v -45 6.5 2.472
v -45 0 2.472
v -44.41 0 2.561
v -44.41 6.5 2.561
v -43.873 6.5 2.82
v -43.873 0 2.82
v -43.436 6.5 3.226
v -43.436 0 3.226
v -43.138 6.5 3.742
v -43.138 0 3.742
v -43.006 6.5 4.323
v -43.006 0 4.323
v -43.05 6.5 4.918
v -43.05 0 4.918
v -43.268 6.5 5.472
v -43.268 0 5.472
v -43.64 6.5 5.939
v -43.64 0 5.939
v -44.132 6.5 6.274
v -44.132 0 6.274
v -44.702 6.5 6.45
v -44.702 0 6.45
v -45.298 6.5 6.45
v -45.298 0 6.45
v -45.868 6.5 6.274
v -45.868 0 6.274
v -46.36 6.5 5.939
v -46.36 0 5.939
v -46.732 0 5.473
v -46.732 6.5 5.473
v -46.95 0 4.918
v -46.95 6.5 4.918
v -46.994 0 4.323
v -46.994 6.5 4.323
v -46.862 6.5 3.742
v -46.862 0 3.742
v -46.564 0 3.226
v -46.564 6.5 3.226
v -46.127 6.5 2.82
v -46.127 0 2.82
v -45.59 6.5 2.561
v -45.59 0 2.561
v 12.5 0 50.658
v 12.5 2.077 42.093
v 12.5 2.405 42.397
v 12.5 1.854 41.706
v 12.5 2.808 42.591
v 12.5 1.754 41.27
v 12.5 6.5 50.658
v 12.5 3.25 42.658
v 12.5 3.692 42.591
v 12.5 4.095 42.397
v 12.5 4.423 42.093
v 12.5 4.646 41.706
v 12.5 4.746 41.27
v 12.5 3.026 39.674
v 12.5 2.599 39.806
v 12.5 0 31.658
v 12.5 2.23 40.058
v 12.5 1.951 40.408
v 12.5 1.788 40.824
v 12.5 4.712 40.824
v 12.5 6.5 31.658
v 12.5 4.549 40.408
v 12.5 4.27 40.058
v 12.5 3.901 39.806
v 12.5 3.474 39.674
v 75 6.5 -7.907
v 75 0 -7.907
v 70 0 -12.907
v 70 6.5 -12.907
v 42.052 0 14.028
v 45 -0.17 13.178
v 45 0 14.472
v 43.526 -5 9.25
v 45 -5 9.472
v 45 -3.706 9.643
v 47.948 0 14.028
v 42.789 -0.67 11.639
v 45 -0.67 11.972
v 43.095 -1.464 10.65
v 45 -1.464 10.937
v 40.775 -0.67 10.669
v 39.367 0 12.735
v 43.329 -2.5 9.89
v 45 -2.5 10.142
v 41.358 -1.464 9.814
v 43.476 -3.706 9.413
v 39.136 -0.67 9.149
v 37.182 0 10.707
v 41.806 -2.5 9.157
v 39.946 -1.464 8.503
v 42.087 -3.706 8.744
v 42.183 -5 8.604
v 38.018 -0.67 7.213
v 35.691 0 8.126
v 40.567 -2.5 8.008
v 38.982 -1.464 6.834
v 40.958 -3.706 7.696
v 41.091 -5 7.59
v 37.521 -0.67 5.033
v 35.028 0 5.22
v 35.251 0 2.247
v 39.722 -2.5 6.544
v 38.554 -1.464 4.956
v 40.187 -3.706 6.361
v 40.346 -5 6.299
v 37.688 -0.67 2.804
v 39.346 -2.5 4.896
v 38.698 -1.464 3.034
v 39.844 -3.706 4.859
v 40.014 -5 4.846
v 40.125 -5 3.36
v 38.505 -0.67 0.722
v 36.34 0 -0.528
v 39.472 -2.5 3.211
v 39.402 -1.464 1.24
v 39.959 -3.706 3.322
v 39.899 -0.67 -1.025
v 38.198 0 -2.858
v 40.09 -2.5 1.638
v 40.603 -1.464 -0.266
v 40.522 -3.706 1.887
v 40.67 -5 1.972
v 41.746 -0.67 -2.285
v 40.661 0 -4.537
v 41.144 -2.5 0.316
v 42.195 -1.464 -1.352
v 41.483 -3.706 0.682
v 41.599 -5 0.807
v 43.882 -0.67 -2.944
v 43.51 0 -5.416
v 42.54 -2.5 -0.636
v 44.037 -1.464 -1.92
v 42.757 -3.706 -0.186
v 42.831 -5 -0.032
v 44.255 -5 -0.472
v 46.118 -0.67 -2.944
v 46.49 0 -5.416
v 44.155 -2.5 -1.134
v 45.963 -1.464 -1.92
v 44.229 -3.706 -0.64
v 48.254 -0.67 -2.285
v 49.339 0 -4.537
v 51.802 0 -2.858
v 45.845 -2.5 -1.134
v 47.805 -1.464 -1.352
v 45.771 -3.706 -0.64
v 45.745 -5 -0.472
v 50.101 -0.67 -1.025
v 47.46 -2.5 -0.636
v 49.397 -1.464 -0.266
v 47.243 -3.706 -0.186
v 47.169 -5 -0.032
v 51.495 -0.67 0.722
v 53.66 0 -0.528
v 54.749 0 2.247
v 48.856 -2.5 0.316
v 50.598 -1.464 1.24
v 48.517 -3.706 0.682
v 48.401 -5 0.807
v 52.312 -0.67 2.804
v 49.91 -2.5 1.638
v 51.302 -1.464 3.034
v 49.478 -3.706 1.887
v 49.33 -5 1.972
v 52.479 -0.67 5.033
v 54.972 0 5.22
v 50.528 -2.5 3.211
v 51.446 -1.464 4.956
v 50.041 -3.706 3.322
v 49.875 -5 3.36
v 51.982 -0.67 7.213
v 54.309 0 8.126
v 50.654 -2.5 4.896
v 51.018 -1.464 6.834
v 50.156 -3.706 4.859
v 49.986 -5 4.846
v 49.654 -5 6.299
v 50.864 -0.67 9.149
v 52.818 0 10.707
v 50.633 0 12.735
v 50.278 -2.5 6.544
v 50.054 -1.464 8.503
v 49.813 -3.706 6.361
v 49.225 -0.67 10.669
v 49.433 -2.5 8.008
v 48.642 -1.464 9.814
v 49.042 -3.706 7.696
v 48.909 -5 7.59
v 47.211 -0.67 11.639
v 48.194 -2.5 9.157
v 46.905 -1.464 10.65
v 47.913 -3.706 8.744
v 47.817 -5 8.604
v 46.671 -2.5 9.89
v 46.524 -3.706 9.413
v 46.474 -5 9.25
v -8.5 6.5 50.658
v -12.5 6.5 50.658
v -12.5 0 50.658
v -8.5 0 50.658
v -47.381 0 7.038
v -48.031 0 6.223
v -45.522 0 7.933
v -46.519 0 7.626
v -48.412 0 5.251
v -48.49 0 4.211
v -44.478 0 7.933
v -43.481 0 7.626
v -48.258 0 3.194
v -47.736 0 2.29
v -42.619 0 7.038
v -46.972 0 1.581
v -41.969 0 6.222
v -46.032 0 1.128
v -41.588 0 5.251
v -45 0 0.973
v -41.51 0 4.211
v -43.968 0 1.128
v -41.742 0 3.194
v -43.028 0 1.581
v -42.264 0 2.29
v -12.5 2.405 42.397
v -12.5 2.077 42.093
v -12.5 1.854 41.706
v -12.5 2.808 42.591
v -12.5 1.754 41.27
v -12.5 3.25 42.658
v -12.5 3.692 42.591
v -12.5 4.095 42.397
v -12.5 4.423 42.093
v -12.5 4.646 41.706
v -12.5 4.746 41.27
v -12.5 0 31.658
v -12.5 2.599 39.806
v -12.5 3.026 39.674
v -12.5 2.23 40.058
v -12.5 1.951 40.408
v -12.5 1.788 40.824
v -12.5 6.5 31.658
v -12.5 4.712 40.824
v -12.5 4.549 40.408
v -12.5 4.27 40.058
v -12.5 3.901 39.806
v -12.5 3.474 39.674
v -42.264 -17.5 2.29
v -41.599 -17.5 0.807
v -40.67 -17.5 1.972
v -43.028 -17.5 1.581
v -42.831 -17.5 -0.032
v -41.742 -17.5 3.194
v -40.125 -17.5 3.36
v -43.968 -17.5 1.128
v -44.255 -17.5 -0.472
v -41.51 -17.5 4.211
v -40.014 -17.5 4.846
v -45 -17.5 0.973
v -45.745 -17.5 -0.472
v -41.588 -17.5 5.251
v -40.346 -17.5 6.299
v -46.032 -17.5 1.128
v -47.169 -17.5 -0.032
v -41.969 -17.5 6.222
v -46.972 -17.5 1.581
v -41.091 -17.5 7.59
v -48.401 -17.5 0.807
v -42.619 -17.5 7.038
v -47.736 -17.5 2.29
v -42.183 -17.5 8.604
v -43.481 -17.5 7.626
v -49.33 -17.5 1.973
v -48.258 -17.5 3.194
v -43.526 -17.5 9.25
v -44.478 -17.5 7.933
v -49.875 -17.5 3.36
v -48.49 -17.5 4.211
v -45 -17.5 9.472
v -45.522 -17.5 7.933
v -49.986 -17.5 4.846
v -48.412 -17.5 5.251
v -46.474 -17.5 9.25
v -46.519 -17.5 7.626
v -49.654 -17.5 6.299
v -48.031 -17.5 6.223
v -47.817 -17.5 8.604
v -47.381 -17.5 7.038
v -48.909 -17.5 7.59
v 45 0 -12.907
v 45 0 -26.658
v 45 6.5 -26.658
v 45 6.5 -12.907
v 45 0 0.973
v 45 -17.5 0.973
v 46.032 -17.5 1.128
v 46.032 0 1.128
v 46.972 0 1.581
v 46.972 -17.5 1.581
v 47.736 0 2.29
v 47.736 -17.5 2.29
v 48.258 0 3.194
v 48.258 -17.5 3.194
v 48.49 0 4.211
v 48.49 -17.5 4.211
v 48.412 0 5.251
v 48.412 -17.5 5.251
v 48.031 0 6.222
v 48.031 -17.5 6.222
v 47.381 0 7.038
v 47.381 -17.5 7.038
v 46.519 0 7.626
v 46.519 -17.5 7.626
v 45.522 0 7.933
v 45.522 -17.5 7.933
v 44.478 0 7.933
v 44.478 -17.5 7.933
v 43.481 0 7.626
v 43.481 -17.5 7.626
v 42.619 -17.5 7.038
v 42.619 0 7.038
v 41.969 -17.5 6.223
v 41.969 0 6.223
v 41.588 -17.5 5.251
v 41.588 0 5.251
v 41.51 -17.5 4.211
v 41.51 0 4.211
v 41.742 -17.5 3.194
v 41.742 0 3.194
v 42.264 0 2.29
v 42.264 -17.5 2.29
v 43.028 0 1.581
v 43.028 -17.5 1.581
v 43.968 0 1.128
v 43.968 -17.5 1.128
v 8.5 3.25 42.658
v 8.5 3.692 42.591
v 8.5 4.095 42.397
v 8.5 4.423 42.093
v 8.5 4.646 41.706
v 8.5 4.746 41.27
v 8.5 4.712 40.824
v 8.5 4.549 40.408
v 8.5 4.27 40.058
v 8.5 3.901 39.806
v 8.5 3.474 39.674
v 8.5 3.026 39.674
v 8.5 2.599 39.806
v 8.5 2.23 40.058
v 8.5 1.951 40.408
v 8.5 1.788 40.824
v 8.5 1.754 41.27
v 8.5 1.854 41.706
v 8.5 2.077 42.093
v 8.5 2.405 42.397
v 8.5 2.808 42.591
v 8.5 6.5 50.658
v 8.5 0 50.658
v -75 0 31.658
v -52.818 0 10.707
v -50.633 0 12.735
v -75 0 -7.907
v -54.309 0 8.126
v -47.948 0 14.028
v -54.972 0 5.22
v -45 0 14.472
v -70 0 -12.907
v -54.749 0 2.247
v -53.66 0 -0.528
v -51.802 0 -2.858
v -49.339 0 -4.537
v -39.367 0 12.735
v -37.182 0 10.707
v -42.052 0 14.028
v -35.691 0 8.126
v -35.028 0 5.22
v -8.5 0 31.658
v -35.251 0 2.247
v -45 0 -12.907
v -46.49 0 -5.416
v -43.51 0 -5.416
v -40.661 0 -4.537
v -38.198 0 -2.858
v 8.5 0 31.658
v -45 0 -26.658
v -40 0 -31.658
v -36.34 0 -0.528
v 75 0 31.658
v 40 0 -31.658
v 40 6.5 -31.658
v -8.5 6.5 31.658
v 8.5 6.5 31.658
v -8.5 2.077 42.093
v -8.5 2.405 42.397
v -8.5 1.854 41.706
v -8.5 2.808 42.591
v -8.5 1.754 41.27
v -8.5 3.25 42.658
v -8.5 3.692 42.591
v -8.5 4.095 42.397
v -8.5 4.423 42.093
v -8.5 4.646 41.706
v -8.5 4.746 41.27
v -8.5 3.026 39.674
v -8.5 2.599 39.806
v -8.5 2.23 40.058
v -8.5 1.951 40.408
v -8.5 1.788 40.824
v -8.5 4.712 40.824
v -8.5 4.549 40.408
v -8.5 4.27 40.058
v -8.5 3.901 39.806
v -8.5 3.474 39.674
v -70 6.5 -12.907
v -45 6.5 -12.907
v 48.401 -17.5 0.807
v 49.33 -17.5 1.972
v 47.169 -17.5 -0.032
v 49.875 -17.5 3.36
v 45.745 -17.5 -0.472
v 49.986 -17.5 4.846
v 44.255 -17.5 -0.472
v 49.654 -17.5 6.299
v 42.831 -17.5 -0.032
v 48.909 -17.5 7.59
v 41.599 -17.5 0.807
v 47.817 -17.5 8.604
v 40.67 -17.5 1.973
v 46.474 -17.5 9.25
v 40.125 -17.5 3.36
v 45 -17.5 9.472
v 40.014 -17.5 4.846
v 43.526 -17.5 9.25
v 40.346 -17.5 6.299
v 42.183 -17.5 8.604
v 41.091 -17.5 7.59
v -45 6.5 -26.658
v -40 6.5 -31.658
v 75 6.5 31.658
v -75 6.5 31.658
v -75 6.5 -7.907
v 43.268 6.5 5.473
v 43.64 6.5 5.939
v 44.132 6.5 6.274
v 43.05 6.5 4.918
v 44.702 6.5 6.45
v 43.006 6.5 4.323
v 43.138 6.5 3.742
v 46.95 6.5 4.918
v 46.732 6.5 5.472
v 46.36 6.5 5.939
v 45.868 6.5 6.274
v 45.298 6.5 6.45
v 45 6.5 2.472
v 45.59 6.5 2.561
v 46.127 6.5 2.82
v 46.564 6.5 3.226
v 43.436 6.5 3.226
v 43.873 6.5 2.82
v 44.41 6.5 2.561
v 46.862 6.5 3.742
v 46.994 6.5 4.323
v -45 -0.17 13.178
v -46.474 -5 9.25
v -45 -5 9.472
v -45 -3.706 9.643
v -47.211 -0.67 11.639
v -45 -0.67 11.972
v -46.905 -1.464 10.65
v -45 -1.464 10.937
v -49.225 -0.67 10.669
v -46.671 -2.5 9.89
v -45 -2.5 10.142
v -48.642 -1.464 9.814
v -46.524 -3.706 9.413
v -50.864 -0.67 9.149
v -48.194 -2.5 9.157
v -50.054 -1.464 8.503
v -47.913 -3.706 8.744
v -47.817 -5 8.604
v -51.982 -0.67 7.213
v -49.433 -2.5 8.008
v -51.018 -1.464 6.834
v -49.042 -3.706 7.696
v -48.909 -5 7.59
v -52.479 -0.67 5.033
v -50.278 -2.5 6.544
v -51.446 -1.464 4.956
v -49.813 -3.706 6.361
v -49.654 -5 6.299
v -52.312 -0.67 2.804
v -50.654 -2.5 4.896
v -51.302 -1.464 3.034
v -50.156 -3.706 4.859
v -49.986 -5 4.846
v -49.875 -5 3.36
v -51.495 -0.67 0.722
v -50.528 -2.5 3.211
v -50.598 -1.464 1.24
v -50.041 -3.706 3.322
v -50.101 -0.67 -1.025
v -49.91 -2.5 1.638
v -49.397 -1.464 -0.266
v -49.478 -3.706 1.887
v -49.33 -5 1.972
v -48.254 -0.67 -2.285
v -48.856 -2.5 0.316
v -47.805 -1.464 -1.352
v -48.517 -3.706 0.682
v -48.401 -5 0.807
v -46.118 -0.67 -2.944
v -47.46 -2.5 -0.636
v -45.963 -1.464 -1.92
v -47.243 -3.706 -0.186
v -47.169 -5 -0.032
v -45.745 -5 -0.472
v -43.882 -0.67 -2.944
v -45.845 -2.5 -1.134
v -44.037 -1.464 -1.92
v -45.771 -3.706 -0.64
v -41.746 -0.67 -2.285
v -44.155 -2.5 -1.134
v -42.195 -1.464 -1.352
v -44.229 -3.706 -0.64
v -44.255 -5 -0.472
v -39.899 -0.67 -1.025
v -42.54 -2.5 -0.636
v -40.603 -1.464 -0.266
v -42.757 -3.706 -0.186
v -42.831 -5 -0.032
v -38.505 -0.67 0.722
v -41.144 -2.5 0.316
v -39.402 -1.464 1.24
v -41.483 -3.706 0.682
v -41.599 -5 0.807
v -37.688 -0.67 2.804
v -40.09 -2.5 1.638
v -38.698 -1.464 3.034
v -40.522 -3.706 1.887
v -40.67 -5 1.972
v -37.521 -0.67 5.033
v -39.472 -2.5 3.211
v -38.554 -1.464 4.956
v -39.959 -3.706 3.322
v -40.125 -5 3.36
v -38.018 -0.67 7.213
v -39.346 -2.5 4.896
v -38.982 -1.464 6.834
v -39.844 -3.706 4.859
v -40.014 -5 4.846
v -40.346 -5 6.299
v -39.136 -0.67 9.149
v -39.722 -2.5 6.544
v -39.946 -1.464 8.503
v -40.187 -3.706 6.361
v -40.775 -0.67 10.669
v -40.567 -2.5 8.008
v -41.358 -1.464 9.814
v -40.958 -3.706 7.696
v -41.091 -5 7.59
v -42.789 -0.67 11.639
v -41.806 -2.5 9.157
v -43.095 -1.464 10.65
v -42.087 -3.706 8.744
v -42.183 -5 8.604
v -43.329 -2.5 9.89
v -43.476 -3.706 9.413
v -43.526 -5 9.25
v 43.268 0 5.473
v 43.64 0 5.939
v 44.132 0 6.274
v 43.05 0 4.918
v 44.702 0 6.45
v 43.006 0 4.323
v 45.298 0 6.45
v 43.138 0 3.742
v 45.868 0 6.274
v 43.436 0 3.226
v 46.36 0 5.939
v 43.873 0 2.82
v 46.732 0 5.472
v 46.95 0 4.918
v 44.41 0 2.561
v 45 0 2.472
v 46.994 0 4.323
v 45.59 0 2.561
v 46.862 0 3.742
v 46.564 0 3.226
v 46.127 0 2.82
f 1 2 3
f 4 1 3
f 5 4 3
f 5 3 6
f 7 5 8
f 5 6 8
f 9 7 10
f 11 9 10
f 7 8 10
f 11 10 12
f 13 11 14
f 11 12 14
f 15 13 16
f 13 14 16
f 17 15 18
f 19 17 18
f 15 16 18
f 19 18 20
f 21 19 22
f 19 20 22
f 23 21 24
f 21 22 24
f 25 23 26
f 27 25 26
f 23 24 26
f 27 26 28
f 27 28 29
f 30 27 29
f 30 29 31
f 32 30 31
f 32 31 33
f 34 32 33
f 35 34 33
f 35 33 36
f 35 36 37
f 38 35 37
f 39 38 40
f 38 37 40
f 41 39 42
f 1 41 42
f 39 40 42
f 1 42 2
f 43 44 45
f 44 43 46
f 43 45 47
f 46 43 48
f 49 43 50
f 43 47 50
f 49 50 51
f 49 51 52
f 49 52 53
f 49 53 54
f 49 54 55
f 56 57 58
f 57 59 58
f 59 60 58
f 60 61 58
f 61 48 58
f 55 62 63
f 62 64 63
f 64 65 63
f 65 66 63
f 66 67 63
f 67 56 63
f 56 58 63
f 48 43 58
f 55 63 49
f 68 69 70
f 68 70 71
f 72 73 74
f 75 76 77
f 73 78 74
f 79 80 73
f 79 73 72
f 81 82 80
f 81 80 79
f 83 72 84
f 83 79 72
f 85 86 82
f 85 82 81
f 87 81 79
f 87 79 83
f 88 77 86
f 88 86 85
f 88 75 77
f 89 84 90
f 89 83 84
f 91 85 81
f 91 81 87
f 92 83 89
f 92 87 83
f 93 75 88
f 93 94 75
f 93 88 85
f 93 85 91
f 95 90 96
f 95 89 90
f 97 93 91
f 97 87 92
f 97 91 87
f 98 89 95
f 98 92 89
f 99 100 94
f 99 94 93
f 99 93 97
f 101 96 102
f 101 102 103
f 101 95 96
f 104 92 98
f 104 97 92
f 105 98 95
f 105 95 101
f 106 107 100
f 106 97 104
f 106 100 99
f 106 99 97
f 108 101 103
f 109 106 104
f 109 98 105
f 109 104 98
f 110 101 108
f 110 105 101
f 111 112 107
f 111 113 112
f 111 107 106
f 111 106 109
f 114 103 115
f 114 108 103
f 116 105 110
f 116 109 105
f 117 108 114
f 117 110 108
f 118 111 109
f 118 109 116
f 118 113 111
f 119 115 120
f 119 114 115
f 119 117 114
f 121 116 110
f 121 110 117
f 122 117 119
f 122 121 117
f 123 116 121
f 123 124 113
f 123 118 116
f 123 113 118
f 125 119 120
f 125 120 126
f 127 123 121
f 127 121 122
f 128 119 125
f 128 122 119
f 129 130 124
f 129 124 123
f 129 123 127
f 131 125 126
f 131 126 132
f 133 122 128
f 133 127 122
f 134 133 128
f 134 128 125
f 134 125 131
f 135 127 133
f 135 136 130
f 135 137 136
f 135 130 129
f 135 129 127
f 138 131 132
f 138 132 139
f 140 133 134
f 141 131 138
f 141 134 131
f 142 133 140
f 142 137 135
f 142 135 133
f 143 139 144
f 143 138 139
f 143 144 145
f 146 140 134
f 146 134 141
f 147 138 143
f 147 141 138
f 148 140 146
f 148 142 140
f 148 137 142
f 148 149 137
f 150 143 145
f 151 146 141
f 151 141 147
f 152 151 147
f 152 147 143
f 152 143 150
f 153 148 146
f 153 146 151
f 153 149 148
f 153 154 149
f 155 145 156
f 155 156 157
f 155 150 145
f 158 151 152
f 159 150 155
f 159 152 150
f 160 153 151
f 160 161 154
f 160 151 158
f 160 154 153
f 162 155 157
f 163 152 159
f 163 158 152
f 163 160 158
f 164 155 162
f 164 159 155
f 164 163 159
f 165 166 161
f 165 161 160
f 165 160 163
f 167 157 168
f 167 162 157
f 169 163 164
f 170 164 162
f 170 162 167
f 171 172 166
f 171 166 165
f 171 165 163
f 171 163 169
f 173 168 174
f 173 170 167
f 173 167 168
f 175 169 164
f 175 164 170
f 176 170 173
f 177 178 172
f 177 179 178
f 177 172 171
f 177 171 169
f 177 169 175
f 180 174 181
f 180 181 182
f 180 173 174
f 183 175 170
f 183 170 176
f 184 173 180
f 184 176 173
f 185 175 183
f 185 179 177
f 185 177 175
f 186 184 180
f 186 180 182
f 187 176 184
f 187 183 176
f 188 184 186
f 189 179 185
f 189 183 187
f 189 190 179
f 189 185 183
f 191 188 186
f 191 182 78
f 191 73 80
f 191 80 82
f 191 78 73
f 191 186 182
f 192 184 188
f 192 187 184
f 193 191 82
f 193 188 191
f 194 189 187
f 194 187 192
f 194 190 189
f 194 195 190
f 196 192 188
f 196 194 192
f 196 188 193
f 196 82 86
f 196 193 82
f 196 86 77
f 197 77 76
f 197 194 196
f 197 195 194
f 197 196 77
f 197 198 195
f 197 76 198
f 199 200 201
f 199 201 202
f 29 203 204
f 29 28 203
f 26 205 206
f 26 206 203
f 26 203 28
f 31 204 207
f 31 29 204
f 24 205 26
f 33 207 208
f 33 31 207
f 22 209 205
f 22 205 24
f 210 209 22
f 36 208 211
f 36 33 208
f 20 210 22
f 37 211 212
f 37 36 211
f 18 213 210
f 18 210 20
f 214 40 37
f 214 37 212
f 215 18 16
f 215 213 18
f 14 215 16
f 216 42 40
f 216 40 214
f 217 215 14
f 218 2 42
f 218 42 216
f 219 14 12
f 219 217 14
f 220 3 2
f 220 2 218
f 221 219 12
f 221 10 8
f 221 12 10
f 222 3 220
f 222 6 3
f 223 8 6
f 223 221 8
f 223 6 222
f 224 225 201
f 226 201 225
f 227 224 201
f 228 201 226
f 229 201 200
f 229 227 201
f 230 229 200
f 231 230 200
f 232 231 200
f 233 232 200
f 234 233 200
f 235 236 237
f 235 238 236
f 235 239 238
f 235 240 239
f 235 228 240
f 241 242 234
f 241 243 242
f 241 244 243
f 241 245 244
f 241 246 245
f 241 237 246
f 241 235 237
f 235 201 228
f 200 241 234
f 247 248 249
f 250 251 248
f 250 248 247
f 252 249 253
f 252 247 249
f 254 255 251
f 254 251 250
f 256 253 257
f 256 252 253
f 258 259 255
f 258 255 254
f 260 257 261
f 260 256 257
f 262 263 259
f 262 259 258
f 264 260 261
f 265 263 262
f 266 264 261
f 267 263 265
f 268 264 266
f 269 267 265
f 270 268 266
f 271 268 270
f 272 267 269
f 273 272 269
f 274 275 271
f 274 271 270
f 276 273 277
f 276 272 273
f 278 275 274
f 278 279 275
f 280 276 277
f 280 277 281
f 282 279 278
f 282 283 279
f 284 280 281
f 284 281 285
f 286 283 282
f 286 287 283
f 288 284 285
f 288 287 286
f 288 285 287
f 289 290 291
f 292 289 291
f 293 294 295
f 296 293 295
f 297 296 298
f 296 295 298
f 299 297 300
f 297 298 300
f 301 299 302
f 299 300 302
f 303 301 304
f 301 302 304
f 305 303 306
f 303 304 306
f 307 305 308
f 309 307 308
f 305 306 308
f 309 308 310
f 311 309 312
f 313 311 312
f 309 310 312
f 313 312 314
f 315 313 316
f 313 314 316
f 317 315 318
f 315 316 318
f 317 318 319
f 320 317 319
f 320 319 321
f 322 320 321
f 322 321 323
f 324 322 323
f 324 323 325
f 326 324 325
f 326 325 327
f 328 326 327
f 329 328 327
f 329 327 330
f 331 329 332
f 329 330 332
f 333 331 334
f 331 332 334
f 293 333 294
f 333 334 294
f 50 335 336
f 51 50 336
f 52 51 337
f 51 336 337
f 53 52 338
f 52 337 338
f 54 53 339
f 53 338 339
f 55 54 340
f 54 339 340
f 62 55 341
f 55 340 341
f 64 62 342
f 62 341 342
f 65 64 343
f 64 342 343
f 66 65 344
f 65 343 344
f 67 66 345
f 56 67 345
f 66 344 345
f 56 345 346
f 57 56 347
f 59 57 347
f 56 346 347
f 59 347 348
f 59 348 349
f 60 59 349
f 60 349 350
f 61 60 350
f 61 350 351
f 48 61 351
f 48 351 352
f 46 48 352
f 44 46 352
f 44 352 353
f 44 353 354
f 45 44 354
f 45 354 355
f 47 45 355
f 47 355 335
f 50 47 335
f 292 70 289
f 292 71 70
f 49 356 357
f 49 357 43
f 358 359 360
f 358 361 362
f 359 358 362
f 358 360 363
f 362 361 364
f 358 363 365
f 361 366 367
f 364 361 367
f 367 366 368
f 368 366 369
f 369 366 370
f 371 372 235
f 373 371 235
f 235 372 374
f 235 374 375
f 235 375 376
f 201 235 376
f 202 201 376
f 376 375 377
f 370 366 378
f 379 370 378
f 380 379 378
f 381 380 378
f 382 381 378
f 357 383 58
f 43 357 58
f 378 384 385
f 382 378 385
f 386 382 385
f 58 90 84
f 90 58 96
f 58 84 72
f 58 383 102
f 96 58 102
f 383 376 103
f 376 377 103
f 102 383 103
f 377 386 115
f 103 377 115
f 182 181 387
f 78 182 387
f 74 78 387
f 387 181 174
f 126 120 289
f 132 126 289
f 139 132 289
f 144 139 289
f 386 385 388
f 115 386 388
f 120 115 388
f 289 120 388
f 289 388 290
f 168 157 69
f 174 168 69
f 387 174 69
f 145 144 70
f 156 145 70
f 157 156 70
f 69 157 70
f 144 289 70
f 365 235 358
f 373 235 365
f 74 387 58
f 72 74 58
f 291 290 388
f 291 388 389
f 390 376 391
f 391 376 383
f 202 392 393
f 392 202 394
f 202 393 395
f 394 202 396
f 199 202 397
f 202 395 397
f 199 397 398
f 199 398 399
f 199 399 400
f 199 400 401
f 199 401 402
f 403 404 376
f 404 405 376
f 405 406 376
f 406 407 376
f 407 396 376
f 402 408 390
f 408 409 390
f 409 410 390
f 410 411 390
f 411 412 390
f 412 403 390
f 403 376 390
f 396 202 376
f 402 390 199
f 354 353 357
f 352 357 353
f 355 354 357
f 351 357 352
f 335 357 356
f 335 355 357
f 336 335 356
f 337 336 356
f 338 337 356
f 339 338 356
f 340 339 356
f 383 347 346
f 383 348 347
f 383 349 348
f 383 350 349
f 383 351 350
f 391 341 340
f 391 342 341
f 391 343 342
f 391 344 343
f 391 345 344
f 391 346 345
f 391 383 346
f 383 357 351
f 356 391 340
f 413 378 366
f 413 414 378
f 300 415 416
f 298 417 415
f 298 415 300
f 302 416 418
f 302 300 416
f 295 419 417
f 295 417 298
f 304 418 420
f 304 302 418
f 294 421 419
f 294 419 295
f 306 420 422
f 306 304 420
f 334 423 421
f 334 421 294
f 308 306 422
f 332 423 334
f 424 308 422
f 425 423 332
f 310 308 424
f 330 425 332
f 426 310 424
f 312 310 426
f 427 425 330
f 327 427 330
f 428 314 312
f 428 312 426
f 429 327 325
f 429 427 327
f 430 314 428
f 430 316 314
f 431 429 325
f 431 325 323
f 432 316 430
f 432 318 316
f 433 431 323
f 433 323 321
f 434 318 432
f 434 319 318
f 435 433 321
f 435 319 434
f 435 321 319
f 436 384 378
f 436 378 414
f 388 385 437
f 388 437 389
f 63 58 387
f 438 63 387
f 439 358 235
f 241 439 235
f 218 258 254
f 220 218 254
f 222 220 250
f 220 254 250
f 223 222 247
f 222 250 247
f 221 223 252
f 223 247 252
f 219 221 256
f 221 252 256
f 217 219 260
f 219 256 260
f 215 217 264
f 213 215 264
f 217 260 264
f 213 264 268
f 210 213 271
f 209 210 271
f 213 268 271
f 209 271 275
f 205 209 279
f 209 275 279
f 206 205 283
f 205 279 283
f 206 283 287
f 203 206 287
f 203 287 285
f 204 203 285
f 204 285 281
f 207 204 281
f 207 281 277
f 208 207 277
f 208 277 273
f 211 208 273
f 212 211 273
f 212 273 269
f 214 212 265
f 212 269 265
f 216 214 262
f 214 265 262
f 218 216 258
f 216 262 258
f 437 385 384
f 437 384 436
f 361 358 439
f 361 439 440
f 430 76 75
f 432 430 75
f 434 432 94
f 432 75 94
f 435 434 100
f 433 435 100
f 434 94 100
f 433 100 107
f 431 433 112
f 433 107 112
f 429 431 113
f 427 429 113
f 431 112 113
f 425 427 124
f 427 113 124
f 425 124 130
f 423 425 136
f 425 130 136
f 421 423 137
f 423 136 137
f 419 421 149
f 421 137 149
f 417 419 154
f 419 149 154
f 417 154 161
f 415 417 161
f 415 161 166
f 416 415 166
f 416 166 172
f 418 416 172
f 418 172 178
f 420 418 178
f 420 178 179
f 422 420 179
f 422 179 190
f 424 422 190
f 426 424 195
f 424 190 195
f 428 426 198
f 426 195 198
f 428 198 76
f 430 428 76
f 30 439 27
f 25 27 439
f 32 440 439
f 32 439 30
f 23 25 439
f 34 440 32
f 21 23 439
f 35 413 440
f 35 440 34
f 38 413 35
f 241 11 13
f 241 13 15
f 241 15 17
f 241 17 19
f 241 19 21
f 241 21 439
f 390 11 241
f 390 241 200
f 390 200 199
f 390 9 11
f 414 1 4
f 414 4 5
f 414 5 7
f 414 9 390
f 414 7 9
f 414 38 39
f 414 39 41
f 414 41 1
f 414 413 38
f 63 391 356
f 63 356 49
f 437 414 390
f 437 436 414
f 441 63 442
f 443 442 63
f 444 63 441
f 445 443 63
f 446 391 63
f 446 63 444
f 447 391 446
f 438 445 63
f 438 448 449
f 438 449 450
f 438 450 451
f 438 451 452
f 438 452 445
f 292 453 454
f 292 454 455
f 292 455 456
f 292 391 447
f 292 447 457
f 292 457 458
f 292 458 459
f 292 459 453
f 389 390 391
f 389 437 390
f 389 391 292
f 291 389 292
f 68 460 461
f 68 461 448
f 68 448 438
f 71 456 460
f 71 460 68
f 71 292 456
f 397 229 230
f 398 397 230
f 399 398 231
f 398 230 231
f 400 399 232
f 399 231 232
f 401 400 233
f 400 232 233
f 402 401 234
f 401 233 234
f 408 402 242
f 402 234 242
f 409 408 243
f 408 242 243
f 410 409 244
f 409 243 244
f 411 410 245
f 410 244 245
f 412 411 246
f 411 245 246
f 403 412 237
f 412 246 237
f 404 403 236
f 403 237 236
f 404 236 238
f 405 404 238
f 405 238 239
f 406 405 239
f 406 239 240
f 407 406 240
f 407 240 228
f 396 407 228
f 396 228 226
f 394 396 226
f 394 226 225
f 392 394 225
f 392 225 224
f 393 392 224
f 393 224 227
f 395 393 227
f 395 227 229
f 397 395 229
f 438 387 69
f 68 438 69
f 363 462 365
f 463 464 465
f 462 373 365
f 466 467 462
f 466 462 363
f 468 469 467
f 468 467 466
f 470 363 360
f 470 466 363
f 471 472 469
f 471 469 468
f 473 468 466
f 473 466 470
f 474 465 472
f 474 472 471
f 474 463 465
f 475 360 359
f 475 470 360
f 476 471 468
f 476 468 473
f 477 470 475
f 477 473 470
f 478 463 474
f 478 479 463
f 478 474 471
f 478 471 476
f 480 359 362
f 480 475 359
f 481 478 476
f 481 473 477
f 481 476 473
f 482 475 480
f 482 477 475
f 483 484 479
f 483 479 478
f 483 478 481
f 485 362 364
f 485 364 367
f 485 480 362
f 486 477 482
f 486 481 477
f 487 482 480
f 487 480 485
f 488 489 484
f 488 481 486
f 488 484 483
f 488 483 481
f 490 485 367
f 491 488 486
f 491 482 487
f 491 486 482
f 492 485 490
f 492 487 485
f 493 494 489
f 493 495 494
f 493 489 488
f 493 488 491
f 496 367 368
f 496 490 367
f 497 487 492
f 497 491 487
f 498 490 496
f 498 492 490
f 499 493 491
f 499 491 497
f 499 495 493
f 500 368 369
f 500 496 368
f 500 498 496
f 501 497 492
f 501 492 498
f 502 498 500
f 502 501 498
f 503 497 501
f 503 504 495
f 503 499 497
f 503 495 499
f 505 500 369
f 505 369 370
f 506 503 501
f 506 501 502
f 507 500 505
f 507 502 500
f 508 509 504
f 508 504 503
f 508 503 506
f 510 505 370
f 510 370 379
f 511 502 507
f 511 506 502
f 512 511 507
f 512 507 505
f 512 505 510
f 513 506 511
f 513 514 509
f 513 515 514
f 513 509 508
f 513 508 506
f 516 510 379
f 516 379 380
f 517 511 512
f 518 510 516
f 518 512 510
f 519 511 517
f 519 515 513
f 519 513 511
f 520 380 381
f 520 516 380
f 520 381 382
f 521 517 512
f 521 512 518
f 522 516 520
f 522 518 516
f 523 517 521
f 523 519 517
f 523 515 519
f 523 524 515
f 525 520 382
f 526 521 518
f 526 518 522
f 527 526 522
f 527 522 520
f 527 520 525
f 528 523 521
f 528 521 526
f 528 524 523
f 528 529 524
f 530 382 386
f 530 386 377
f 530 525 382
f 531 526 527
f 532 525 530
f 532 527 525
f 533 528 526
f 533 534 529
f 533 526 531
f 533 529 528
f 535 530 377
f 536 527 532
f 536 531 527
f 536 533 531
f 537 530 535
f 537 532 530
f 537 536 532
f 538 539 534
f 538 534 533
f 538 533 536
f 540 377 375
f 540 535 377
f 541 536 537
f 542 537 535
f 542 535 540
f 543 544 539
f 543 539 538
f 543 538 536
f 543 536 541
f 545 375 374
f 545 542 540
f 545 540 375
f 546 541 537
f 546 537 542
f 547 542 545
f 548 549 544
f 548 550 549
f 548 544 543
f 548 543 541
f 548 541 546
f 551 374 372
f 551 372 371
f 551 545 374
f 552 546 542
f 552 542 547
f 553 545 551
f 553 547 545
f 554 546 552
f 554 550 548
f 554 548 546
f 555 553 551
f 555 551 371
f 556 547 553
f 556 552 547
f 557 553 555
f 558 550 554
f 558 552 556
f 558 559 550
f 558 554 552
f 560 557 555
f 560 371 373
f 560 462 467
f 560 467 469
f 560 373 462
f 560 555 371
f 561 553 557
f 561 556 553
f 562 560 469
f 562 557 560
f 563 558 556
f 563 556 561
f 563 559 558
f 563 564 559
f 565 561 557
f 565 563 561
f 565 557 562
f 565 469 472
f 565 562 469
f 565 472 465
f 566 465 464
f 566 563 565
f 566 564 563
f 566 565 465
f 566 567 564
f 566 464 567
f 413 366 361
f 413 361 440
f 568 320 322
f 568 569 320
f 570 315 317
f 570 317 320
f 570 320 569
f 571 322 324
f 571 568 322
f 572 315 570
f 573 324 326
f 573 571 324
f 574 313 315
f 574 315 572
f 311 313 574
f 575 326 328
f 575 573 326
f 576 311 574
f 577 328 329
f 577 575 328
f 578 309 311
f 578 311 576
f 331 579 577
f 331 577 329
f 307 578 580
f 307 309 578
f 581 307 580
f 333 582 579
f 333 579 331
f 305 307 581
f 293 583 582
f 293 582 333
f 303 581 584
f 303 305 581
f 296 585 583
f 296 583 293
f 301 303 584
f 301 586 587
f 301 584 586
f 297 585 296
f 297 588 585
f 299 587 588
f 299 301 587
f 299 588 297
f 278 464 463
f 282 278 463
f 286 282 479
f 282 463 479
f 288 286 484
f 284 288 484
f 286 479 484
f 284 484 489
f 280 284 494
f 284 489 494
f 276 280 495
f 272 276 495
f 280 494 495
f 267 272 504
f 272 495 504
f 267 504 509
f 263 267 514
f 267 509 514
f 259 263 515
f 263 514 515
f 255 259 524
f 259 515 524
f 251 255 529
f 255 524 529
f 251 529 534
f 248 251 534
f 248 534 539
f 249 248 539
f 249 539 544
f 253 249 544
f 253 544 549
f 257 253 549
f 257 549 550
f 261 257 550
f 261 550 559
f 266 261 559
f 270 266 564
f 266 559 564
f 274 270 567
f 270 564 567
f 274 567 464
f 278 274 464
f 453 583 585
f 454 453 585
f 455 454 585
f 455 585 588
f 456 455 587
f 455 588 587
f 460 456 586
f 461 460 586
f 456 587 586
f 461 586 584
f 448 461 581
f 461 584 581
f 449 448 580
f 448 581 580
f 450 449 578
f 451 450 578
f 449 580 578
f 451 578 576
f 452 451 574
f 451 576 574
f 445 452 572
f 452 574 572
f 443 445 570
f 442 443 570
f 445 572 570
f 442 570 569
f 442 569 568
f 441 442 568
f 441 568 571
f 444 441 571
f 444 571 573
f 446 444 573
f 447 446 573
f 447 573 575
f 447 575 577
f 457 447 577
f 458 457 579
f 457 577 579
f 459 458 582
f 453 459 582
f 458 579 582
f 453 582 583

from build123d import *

# Parameters (mm, degrees)
SKETCH1_W           = 150
SKETCH1_H           = 63.315
BOSS_EXTRUDE1_DEPTH = 6.5
SKETCH2_W           = 4
SKETCH2_H           = 6.5
BOSS_EXTRUDE2_DEPTH = 19
SKETCH3_W           = 30
SKETCH3_H           = 6.5
CUT_EXTRUDE1_DEPTH  = 18.75
CHAMFER1_SIZE       = 5
SKETCH5_R           = 5
BOSS_EXTRUDE3_DEPTH = 17.5
FILLET1_R           = 5
SKETCH6_R           = 3.5
CUT_EXTRUDE2_DEPTH  = 17.5
SKETCH7_R           = 3.5
CUT_EXTRUDE3_DEPTH  = 17.5
SKETCH8_R           = 2
CUT_EXTRUDE4_DEPTH  = 6.5
SKETCH9_R           = 1.5
CUT_EXTRUDE5_DEPTH  = 25


with BuildPart() as part:
    # Sketch1 → Boss-Extrude1 (new body)
    with BuildSketch(Plane(origin=(0, 0, 0), x_dir=(1, 0, 0), z_dir=(0, 1, 0))):
        Rectangle(SKETCH1_W, SKETCH1_H)
    extrude(amount=BOSS_EXTRUDE1_DEPTH)

    # Sketch2 → Boss-Extrude2 (add)
    with BuildSketch(Plane.XY.offset(31.6575)):
        with Locations((-10.5, 3.25)):
            Rectangle(SKETCH2_W, SKETCH2_H)
        with Locations((10.5, 3.25)):
            Rectangle(SKETCH2_W, SKETCH2_H)
    extrude(amount=BOSS_EXTRUDE2_DEPTH)

    # Sketch3 → Cut-Extrude1 (cut)
    with BuildSketch(Plane(origin=(0, 0, -31.6575), x_dir=(-1, 0, 0), z_dir=(0, 0, -1))):
        with Locations((-60, 3.25)):
            Rectangle(SKETCH3_W, SKETCH3_H)
        with Locations((60, 3.25)):
            Rectangle(SKETCH3_W, SKETCH3_H)
    extrude(amount=-CUT_EXTRUDE1_DEPTH, mode=Mode.SUBTRACT)

    # Chamfer1
    chamfer1_edges = [part.edges().sort_by_distance(p)[0] for p in [
        (75, 3.25, -12.9075),
        (45, 3.25, -31.6575),
        (-75, 3.25, -12.9075),
        (-45, 3.25, -31.6575),
    ]]
    chamfer(chamfer1_edges, length=CHAMFER1_SIZE)

    # Sketch5 → Boss-Extrude3 (add)
    with BuildSketch(Plane.XZ):
        with Locations(Location((45, 4.4725, 0), (0, 0, 90))):
            Circle(SKETCH5_R)
        with Locations(Location((-45, 4.4725, 0), (0, 0, 90))):
            Circle(SKETCH5_R)
    extrude(amount=BOSS_EXTRUDE3_DEPTH)

    # Fillet1
    fillet1_edges = [part.edges().sort_by_distance(p)[0] for p in [
        (-45, 0, -0.5275),
        (45, 0, -0.5275),
    ]]
    fillet(fillet1_edges, radius=FILLET1_R)

    # Sketch6 → Cut-Extrude2 (cut)
    with BuildSketch(Plane.XZ.offset(17.5)):
        with Locations(Location((45, 4.4725, 0), (0, 0, 270))):
            Circle(SKETCH6_R)
    extrude(amount=-CUT_EXTRUDE2_DEPTH, mode=Mode.SUBTRACT)

    # Sketch7 → Cut-Extrude3 (cut)
    with BuildSketch(Plane.XZ.offset(17.5)):
        with Locations(Location((-45, 4.4725, 0), (0, 0, 270))):
            Circle(SKETCH7_R)
    extrude(amount=-CUT_EXTRUDE3_DEPTH, mode=Mode.SUBTRACT)

    # Sketch8 → Cut-Extrude4 (cut)
    with BuildSketch(Plane.XZ):
        with Locations(Location((45, 4.4725, 0), (0, 0, 270))):
            Circle(SKETCH8_R)
        with Locations(Location((-45, 4.4725, 0), (0, 0, 270))):
            Circle(SKETCH8_R)
    extrude(amount=-CUT_EXTRUDE4_DEPTH, mode=Mode.SUBTRACT)

    # Sketch9 → Cut-Extrude5 (cut)
    with BuildSketch(Plane.ZY.offset(12.5)):
        with Locations((41.1575, 3.25)):
            Circle(SKETCH9_R)
    extrude(amount=-CUT_EXTRUDE5_DEPTH, mode=Mode.SUBTRACT)


solid = part.part
